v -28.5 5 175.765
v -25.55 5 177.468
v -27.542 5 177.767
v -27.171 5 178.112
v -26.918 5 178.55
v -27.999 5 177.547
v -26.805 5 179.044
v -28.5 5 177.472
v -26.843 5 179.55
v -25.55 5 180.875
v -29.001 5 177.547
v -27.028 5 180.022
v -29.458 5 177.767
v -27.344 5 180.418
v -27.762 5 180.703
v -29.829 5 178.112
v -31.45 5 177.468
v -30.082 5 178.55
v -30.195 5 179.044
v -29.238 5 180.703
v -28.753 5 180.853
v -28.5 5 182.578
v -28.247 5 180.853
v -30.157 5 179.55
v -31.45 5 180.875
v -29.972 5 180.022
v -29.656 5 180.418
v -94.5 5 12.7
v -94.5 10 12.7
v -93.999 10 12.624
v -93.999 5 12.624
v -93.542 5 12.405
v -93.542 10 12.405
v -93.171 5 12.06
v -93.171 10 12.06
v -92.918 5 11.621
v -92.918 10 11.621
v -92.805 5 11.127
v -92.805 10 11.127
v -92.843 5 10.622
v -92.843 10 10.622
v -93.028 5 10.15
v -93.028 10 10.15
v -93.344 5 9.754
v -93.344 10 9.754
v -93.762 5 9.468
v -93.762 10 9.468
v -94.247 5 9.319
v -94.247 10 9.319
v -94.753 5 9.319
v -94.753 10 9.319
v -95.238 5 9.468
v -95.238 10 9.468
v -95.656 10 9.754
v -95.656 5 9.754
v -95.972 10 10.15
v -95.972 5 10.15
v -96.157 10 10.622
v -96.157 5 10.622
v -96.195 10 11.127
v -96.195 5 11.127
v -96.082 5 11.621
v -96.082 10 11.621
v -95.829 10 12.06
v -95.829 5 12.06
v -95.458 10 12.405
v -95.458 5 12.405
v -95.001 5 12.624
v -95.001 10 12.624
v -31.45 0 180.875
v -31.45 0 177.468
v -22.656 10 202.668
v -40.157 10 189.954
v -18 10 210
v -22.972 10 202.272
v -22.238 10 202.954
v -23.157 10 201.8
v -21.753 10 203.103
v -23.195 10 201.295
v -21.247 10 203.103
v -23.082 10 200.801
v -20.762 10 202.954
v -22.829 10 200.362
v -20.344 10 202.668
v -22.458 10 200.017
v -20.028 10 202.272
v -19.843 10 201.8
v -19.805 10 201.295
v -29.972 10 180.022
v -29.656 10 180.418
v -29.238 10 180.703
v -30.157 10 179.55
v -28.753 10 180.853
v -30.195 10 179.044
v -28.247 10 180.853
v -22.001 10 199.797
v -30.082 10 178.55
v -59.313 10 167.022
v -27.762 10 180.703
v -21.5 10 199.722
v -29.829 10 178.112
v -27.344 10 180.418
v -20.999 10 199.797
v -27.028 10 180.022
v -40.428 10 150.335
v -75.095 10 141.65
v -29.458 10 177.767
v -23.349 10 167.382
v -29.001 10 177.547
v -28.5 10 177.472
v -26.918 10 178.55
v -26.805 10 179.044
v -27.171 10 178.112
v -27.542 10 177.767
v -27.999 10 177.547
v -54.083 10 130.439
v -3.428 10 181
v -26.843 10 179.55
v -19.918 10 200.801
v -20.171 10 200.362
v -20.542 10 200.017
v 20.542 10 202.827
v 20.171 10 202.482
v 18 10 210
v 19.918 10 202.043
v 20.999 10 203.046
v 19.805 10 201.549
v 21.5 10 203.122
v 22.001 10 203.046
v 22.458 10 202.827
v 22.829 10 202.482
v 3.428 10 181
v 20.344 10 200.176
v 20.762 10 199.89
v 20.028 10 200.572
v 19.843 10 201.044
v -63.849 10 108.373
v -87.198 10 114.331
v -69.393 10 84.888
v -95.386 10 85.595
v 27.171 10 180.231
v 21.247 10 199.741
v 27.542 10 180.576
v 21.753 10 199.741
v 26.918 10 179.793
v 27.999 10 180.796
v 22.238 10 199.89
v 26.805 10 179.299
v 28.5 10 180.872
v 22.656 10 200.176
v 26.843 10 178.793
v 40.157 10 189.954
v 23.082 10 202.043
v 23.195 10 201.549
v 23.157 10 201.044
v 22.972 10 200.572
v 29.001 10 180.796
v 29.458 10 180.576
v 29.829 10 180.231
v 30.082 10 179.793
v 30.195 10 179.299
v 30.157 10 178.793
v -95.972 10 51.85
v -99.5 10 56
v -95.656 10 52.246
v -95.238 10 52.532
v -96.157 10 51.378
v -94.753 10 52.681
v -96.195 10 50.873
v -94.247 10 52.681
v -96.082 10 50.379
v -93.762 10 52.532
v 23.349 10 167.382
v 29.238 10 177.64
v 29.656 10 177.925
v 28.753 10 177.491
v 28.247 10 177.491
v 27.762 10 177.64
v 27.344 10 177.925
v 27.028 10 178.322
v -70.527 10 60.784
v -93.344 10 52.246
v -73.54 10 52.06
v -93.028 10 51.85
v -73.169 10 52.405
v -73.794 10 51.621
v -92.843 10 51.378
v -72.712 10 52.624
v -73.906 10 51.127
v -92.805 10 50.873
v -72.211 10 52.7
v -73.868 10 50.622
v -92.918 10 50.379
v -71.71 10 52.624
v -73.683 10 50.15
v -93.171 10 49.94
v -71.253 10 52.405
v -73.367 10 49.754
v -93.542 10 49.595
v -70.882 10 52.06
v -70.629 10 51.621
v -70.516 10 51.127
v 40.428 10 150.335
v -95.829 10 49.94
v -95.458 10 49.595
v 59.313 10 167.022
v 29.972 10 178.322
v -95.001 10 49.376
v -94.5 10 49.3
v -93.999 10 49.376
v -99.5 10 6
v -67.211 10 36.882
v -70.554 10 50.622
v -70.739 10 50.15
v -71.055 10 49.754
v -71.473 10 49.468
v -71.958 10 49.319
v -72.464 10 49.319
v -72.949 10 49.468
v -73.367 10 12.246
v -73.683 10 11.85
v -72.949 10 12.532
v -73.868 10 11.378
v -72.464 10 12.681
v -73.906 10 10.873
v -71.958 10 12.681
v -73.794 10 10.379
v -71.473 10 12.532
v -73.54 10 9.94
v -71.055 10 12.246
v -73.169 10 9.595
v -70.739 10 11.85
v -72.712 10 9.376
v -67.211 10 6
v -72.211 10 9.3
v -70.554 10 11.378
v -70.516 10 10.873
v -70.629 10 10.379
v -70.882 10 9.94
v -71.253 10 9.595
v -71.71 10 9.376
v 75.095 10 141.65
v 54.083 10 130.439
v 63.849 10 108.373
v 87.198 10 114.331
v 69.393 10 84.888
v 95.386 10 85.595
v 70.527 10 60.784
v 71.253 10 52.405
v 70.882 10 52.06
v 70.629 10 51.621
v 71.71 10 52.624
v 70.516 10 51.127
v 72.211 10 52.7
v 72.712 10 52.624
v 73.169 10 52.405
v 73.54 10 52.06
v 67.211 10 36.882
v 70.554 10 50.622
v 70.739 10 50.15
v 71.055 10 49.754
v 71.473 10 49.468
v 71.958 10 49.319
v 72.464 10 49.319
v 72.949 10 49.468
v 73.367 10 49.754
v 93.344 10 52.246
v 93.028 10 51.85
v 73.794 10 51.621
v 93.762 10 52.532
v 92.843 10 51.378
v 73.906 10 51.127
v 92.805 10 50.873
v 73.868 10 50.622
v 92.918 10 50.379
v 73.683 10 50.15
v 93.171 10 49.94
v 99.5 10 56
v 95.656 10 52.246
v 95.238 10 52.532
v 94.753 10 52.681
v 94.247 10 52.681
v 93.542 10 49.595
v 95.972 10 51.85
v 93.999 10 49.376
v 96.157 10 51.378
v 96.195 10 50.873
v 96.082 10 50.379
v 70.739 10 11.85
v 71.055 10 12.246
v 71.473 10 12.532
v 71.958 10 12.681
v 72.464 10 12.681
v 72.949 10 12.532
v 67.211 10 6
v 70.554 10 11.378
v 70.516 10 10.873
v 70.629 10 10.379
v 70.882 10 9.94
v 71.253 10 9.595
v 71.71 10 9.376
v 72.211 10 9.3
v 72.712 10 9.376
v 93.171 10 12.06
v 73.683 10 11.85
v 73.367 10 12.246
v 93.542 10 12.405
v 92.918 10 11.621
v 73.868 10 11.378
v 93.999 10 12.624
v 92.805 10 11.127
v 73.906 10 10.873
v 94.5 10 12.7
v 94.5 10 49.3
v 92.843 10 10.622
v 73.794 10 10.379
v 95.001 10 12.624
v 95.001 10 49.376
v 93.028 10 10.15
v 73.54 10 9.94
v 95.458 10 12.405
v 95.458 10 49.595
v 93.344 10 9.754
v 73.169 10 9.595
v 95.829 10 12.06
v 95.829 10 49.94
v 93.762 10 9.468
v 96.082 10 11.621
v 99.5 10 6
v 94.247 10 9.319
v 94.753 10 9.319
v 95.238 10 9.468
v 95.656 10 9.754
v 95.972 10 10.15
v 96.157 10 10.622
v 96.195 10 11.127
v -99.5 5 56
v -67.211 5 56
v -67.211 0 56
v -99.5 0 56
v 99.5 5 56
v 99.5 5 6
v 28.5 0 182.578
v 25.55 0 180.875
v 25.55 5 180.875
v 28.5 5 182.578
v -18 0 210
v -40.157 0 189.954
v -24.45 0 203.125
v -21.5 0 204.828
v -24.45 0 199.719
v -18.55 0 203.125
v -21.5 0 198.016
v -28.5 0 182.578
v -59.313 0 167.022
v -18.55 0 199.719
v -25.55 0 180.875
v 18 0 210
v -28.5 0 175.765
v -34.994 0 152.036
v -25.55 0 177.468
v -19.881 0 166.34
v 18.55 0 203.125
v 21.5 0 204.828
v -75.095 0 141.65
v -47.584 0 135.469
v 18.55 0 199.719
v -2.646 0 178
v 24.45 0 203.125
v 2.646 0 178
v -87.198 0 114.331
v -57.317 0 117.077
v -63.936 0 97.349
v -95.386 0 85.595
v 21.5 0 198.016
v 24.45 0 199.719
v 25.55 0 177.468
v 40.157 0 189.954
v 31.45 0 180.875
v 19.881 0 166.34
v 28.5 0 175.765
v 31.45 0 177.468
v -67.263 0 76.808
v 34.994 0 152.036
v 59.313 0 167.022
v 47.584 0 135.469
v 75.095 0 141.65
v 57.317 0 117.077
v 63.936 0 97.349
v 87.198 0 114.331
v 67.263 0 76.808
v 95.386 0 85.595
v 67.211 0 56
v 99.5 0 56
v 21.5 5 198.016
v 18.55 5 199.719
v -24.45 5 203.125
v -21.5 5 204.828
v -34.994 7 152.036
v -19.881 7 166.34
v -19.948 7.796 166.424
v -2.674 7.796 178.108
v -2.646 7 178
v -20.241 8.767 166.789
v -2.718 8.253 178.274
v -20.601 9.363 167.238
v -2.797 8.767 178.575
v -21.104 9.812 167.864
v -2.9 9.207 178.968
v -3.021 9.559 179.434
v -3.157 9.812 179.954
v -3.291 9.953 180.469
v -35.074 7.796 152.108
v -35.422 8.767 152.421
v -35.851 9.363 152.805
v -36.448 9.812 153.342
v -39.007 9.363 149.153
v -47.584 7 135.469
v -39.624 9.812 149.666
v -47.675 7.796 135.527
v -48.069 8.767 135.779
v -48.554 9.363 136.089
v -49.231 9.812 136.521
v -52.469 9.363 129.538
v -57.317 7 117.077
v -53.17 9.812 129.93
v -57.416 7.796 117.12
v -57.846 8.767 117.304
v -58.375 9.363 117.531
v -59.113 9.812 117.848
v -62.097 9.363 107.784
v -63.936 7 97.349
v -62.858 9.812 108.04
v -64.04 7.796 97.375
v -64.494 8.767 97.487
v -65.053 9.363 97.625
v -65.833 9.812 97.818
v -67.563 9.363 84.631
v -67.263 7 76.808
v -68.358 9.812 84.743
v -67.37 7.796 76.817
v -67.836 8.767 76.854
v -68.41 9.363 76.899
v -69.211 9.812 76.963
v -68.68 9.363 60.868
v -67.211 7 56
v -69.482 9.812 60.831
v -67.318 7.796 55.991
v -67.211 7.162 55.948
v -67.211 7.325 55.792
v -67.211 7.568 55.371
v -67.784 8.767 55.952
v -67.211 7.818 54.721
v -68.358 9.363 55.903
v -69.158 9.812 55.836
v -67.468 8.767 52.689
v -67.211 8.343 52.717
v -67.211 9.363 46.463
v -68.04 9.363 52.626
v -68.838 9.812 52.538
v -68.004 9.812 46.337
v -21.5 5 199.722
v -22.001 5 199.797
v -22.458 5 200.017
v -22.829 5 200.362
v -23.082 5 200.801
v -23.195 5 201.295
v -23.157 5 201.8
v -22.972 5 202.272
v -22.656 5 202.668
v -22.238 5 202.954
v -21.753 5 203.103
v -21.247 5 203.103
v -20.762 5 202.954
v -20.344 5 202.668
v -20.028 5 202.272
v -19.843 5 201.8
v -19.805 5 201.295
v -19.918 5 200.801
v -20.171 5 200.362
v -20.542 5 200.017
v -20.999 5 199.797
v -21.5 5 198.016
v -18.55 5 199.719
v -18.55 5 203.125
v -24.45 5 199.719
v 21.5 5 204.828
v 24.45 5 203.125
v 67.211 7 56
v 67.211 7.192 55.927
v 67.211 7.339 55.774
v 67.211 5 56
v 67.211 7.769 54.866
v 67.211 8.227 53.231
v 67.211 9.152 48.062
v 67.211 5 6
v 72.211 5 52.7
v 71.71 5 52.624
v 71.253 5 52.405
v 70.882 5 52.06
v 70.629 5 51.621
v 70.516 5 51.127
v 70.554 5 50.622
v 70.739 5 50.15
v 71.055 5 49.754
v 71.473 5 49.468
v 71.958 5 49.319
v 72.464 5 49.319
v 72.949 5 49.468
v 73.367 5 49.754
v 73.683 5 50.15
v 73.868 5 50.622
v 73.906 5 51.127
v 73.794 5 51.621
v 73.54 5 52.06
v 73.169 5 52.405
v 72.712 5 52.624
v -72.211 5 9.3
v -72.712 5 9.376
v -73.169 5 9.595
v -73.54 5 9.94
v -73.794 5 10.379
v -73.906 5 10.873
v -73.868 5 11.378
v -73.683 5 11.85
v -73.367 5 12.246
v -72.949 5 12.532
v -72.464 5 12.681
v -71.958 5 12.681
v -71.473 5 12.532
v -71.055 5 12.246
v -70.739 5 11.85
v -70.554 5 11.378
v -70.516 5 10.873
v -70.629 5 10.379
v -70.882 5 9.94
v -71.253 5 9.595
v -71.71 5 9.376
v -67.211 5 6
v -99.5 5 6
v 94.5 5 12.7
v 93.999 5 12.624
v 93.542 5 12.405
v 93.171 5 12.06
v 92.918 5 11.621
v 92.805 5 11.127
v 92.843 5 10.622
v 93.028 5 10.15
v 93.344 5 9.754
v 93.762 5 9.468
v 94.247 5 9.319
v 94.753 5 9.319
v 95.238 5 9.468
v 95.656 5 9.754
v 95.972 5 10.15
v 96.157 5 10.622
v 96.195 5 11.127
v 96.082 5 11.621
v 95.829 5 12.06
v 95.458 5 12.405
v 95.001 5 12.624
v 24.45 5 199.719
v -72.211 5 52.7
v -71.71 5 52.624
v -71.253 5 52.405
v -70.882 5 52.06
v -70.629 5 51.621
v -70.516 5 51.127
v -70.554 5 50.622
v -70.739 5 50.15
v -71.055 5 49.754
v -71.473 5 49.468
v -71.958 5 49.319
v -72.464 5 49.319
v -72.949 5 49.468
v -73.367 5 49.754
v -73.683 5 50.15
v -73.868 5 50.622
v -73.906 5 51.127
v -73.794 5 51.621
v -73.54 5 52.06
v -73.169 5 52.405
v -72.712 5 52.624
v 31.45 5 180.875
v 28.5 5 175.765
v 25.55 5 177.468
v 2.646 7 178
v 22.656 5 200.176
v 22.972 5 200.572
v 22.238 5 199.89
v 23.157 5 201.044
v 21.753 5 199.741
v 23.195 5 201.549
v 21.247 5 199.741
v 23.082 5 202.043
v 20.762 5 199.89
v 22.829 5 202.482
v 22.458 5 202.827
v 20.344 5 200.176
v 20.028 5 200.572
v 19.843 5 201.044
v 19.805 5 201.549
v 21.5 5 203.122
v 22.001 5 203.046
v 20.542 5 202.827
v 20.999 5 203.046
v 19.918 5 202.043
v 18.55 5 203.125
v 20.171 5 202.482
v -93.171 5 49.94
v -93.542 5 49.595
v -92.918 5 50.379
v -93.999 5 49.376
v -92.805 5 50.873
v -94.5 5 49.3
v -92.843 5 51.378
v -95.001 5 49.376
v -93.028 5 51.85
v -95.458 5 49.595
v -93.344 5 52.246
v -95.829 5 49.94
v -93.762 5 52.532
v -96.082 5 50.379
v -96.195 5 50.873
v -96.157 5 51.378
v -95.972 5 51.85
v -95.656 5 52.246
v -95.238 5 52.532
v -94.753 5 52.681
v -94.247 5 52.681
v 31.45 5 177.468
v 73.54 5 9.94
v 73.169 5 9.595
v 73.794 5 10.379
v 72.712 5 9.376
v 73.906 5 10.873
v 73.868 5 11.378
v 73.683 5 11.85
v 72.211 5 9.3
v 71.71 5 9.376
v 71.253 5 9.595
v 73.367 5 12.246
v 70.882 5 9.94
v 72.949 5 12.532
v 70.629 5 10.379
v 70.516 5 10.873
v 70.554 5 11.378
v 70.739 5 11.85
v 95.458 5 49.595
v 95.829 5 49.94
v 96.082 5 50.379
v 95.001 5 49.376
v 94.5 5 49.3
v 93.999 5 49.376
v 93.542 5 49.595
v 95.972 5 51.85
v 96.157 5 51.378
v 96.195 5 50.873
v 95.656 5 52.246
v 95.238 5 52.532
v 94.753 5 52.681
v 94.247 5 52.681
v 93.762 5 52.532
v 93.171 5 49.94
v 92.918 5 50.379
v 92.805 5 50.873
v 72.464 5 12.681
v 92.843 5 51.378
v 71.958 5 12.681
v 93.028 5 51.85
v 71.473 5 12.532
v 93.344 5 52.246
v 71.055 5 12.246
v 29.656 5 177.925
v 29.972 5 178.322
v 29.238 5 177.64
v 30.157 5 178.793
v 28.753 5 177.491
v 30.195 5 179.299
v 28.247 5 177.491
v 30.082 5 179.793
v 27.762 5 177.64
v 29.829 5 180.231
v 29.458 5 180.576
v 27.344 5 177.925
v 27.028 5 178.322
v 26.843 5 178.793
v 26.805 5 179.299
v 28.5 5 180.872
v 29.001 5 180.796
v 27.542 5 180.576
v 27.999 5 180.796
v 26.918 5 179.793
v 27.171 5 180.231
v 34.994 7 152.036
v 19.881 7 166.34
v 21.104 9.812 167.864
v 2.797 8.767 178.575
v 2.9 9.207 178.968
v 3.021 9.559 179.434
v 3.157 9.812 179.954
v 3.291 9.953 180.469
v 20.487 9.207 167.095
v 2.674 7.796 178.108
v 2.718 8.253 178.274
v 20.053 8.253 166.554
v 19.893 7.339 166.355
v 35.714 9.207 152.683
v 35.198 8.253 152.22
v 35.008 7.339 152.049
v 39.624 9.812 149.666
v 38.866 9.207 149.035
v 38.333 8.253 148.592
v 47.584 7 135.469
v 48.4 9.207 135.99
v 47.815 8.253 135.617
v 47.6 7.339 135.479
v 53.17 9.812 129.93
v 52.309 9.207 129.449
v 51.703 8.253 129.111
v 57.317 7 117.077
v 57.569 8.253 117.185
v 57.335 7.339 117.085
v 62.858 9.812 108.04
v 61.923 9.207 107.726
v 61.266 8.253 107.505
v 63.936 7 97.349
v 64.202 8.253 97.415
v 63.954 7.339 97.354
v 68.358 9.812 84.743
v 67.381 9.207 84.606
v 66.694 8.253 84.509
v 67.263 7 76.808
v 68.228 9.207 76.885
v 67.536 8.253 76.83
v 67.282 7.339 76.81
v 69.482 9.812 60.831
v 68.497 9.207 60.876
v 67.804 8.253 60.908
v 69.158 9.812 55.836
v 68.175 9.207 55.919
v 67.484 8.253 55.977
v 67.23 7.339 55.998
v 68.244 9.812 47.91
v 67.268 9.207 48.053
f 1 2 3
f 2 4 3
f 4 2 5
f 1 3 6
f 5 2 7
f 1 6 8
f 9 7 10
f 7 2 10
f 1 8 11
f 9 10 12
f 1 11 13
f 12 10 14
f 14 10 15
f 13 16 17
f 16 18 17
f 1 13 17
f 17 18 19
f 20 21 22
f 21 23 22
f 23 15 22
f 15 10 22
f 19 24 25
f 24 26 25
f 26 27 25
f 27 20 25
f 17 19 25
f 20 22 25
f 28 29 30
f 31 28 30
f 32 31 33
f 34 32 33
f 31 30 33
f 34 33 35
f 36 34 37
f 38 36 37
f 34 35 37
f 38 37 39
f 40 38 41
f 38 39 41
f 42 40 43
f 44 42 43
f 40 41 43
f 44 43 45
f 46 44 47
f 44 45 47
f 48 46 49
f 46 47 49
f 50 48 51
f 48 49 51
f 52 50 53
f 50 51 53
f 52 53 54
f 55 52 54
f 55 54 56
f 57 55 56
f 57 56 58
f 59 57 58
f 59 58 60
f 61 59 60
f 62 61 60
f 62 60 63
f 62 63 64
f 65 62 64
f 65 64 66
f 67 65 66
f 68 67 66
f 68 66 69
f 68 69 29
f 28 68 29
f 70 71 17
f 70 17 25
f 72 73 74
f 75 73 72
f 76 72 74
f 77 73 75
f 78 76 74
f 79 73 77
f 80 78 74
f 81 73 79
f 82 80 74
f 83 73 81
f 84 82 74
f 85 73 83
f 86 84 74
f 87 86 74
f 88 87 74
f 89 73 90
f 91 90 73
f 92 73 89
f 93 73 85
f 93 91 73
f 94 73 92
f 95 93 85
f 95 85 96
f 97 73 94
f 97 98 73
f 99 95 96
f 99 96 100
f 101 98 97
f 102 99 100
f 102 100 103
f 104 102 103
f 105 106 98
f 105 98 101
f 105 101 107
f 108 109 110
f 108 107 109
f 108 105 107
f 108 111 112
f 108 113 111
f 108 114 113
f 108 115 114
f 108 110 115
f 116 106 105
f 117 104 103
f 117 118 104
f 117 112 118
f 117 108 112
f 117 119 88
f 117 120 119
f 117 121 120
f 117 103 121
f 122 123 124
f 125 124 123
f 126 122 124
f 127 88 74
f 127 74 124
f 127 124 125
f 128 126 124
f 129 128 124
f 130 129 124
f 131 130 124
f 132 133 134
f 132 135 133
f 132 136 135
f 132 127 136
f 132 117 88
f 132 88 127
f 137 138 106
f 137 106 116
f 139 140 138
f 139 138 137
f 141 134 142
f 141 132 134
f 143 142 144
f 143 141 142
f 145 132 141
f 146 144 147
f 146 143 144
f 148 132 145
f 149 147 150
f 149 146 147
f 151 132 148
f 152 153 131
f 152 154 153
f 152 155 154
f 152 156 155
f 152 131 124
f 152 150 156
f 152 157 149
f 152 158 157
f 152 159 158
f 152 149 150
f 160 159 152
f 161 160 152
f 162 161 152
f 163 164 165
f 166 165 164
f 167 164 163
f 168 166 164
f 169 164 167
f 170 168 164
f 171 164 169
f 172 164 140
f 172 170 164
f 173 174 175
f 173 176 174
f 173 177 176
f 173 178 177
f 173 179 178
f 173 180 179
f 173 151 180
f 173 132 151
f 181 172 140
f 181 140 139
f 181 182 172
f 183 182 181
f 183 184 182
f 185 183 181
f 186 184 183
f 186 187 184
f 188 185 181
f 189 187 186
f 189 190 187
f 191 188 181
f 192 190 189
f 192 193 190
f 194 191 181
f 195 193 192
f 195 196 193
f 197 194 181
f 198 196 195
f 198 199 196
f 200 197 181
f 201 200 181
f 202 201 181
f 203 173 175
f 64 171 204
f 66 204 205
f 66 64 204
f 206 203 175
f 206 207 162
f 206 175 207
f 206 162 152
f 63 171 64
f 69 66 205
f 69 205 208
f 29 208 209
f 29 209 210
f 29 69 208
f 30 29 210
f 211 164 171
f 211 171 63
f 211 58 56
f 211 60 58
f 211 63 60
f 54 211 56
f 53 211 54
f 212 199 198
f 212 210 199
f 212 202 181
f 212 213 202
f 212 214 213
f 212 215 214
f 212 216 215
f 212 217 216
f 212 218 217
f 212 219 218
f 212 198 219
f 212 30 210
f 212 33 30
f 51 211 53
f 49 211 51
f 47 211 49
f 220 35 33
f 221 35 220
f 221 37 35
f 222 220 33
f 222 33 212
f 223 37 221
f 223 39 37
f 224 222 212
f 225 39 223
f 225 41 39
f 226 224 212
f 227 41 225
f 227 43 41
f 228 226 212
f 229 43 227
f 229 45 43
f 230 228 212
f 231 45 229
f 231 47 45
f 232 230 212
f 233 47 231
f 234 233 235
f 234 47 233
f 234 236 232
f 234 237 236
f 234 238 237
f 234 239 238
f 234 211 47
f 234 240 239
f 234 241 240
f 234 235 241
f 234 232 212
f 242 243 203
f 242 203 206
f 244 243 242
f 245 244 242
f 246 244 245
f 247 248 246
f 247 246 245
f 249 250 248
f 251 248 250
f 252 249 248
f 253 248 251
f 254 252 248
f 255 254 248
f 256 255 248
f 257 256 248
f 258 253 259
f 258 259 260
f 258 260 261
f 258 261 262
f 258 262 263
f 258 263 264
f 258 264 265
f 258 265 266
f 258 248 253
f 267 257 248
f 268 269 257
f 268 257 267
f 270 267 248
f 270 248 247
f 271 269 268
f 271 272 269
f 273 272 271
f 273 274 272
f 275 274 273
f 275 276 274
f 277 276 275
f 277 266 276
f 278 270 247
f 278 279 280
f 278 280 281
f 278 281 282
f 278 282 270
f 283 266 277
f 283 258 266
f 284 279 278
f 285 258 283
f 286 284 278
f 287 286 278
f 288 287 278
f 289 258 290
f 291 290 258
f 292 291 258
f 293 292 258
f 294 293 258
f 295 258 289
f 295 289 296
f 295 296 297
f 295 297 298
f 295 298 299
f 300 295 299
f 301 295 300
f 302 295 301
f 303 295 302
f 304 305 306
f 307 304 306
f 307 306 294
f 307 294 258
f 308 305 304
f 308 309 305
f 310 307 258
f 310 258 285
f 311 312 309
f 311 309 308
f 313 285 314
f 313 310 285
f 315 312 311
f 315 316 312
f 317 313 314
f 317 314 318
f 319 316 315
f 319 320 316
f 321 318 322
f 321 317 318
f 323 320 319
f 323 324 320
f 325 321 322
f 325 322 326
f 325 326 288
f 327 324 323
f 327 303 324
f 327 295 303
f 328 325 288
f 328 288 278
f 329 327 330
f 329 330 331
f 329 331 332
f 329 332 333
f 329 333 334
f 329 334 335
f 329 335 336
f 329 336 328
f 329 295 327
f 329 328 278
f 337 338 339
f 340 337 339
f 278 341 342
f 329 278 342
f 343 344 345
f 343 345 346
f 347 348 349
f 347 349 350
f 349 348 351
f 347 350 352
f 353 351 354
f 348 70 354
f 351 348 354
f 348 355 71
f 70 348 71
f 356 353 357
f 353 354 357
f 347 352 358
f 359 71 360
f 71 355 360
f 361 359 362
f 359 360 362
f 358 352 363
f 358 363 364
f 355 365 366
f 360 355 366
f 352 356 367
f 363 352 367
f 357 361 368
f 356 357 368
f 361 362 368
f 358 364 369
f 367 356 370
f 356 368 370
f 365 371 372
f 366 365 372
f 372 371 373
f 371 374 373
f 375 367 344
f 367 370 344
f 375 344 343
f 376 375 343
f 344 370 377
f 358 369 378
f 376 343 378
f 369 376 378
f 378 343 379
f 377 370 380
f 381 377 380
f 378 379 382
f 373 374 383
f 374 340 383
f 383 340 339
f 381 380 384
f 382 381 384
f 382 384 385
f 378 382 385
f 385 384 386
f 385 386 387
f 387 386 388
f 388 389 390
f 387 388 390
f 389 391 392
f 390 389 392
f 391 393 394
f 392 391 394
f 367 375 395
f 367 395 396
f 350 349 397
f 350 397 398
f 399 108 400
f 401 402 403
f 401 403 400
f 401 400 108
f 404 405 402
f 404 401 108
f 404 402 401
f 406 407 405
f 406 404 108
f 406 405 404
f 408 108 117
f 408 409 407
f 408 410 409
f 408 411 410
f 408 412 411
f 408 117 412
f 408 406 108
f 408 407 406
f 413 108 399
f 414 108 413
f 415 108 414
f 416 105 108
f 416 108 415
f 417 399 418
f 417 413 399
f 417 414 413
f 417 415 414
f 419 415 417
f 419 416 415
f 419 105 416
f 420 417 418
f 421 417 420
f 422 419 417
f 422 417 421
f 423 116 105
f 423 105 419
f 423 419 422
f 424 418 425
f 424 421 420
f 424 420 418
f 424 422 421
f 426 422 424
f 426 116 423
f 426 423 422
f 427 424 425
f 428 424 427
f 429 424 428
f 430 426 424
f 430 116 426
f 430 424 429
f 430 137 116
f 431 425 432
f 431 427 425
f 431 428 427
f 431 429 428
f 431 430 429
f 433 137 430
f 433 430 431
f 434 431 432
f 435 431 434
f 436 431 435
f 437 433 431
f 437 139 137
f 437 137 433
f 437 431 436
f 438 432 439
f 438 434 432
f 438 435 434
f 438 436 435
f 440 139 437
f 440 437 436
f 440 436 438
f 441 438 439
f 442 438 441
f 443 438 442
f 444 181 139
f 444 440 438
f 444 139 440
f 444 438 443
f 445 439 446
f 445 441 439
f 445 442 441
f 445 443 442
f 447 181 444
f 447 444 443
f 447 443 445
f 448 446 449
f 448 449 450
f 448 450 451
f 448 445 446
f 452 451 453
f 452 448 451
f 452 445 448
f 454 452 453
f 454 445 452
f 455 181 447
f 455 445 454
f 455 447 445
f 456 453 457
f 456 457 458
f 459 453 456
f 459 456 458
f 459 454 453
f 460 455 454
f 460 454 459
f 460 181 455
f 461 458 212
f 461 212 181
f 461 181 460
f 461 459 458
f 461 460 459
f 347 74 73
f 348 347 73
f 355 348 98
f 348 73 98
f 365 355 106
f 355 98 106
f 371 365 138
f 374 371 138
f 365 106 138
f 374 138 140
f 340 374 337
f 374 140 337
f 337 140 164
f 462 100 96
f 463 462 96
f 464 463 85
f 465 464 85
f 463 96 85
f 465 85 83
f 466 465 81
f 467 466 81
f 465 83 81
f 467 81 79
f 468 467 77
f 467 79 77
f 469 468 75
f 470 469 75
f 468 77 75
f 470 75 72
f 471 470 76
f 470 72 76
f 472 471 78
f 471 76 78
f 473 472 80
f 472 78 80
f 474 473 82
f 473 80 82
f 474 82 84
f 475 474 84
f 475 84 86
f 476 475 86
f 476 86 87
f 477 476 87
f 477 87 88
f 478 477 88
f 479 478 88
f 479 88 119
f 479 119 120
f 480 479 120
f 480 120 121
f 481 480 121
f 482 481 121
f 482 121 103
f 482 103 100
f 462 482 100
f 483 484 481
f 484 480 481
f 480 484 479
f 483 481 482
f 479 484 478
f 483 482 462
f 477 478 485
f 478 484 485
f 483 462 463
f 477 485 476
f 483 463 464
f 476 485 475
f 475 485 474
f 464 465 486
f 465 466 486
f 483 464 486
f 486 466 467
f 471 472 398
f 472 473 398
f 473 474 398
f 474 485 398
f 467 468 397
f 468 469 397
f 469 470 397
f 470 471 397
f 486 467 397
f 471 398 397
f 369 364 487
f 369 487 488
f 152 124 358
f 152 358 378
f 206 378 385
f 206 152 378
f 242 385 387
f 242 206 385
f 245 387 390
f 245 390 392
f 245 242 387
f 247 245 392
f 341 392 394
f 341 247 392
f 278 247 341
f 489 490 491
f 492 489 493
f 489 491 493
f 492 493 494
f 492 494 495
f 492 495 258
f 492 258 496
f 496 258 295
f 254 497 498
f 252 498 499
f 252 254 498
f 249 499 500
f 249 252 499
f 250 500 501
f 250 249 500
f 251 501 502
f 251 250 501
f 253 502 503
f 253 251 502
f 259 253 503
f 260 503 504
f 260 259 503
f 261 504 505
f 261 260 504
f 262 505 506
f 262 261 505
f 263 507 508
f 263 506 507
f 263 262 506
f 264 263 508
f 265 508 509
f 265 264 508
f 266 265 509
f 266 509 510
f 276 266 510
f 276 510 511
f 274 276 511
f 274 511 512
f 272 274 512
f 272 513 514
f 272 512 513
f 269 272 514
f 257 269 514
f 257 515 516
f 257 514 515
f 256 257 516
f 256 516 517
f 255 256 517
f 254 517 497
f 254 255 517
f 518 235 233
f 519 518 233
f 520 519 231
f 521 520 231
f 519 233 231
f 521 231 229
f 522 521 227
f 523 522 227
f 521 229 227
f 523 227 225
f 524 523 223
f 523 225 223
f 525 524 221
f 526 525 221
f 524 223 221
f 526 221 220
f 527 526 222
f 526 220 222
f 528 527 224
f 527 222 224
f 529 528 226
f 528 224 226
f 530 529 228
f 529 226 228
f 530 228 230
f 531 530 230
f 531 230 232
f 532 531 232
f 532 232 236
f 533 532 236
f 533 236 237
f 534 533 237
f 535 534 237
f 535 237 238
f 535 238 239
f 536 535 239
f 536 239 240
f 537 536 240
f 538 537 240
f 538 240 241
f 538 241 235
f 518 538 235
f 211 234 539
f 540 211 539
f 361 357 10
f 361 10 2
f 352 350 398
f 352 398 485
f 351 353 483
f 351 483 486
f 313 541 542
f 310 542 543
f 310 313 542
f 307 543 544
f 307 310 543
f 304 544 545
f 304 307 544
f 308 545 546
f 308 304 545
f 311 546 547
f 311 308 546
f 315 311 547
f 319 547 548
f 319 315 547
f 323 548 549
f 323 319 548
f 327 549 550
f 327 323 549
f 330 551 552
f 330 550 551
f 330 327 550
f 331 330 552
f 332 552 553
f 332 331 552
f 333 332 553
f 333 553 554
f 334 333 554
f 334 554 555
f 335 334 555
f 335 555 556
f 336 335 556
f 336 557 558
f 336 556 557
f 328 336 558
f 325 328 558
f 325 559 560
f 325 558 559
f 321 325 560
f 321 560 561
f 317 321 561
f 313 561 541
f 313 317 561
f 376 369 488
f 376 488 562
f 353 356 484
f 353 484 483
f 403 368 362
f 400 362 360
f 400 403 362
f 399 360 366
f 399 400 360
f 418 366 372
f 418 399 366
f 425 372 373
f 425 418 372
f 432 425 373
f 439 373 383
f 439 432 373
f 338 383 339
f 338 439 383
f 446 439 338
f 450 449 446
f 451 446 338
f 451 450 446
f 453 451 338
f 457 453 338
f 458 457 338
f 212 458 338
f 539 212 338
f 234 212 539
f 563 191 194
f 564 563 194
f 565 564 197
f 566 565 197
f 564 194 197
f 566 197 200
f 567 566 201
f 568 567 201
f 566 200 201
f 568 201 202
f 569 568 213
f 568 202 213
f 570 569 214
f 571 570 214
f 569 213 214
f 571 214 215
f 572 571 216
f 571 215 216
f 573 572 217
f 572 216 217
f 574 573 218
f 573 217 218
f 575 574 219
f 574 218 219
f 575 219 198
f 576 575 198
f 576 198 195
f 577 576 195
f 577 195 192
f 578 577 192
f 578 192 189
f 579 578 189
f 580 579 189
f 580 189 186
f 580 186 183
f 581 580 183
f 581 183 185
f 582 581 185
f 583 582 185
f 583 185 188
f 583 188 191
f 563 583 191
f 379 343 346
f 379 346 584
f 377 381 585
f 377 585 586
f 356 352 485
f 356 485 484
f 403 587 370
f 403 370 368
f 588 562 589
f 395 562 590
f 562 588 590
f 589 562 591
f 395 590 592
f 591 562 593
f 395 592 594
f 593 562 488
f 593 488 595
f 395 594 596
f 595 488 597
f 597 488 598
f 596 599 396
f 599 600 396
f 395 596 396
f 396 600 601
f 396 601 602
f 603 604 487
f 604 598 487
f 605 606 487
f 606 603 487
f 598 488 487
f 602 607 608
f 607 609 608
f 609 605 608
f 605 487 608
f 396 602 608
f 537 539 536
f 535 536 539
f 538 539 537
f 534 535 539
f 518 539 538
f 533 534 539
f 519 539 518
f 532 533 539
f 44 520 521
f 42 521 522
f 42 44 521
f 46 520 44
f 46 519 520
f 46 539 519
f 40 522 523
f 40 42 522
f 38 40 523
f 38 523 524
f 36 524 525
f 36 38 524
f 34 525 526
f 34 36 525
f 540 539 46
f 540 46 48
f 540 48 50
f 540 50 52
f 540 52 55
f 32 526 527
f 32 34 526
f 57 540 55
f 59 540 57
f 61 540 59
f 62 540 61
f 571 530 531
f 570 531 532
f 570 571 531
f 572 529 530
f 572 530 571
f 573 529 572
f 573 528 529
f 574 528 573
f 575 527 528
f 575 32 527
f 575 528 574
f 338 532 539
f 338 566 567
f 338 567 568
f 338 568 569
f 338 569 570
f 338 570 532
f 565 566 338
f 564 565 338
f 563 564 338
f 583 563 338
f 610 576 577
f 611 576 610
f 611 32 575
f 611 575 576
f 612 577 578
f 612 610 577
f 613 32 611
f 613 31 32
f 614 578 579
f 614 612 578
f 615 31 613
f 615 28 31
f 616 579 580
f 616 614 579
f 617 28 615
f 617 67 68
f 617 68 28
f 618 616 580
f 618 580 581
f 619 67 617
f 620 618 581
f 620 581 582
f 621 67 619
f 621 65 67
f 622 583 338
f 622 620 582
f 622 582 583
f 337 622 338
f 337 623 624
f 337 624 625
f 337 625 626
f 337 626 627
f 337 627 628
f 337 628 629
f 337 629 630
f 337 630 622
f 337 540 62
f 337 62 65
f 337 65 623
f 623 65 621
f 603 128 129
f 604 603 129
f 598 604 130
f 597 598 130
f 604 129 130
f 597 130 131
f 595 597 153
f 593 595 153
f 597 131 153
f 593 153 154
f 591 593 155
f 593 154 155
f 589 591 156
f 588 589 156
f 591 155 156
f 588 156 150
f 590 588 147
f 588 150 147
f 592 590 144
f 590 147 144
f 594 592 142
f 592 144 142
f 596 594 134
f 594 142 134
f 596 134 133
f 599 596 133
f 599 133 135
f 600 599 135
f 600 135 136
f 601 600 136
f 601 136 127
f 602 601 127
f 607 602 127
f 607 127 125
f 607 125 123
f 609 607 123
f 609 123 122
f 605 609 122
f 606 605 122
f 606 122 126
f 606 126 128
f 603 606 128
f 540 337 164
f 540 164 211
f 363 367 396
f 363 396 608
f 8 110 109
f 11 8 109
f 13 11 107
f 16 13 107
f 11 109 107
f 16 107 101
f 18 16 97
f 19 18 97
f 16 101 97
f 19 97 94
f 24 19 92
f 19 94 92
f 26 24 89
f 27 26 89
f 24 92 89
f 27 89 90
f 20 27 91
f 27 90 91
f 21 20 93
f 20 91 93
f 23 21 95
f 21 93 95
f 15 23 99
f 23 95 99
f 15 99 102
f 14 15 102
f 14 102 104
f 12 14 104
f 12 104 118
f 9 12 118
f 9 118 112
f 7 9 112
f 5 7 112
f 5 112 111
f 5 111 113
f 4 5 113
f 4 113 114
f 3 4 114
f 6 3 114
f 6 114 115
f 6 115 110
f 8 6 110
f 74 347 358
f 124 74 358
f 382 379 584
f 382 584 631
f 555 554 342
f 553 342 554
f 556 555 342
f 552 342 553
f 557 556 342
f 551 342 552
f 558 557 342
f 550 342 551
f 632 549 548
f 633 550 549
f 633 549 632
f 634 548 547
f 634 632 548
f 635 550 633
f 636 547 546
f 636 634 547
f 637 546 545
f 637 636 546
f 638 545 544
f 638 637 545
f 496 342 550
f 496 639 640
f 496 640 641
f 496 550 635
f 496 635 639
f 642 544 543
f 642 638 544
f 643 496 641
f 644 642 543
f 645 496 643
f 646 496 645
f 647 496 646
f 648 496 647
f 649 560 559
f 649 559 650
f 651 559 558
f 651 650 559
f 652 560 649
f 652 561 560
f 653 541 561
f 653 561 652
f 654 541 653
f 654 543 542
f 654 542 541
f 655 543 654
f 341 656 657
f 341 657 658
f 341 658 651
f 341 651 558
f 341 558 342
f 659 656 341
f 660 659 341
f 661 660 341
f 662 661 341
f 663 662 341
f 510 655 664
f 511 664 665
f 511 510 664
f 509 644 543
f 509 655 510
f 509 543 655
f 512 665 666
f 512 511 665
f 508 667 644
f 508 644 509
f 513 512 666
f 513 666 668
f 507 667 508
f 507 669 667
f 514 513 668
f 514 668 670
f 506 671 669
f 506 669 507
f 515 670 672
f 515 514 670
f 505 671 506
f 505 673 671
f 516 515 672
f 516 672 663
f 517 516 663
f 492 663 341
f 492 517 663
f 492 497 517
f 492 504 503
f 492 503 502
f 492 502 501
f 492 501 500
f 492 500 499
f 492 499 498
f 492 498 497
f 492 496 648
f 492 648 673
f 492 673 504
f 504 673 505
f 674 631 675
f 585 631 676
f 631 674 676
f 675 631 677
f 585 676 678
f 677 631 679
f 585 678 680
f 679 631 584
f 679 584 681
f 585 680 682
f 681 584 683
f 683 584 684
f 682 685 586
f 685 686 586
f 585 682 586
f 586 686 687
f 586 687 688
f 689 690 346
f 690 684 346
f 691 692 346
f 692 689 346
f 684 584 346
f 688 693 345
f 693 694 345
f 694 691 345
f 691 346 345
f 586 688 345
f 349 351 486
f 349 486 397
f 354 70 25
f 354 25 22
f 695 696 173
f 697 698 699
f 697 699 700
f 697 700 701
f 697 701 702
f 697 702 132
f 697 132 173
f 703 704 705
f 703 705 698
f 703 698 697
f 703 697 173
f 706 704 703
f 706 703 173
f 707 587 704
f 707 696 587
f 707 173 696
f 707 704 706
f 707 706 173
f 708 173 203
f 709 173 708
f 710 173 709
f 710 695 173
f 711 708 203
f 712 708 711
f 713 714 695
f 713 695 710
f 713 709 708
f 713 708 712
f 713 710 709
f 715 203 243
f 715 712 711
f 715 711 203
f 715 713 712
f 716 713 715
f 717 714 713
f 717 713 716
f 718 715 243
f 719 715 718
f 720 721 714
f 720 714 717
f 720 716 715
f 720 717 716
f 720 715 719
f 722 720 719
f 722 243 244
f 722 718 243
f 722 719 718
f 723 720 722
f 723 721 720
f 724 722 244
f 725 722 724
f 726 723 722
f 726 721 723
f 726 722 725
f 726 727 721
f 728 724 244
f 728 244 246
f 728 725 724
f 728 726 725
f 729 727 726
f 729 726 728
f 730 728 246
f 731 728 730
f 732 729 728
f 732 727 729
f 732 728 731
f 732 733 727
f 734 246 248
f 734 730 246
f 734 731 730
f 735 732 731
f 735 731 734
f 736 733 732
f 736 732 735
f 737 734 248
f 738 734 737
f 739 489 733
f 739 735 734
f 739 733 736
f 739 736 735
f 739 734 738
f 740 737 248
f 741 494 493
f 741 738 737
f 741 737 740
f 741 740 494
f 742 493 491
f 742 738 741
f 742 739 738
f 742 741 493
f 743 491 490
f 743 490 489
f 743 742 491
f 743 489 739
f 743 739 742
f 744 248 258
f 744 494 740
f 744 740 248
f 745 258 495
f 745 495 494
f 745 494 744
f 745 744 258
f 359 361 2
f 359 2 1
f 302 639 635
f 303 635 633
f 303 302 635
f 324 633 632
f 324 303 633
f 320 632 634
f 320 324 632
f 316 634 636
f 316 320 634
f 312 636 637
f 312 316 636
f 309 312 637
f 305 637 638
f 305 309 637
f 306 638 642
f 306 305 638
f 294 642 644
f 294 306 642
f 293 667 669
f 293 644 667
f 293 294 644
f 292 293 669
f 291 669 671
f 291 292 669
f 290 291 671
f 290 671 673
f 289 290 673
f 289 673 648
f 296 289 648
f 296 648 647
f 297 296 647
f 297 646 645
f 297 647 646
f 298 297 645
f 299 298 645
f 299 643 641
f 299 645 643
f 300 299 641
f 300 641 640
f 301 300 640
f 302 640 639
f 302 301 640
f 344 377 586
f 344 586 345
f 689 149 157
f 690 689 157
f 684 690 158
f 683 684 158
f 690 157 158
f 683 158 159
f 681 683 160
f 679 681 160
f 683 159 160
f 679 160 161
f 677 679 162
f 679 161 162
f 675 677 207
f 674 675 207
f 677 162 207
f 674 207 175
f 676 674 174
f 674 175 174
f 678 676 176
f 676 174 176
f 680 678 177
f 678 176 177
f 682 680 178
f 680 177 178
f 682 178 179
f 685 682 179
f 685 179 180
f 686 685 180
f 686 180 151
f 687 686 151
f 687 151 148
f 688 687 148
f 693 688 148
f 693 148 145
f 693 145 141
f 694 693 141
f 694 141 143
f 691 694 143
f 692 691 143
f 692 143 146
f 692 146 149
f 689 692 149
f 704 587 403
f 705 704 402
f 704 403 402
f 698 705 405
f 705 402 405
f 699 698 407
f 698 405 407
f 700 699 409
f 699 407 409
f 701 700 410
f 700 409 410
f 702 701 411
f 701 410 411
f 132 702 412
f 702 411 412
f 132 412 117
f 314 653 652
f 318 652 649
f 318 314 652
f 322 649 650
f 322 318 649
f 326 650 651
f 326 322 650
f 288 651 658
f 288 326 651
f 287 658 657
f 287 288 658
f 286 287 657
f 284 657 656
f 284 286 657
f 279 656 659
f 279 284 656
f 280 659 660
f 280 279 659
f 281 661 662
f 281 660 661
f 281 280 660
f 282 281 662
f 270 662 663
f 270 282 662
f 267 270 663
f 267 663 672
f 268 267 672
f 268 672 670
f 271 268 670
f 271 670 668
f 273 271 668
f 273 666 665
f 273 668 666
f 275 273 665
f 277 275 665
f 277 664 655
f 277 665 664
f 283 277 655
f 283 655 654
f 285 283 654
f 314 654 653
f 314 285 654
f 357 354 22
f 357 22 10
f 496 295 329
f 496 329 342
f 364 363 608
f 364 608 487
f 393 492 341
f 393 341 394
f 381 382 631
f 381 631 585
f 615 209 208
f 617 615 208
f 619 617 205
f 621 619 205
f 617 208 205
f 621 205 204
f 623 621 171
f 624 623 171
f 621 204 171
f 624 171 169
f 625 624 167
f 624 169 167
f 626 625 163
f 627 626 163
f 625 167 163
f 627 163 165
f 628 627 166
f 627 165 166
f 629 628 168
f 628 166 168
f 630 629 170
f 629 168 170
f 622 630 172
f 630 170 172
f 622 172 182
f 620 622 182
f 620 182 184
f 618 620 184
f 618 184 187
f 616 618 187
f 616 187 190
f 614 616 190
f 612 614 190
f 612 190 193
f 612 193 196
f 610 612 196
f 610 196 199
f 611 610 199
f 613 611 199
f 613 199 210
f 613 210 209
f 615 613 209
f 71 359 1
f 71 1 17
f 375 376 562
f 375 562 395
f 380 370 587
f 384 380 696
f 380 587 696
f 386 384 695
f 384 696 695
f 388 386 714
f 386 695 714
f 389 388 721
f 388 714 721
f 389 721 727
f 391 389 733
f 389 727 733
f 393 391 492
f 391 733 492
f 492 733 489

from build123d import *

# Parameters (mm, degrees)
SKIZZE1_W                        = 199
SKIZZE1_H                        = 420
AUFSATZ_LINEAR_AUSTRAGEN1_DEPTH  = 10
SKIZZE5_W                        = 199
SKIZZE5_H                        = 85
SCHNITT_LINEAR_AUSTRAGEN2_DEPTH  = 10
SKIZZE20_R                       = 1.7
SCHNITT_LINEAR_AUSTRAGEN12_DEPTH = 233.594604409
SKIZZE21_W                       = 134.422077922
SKIZZE21_H                       = 75
SCHNITT_LINEAR_AUSTRAGEN13_DEPTH = 233.594604409
SCHNITT_LINEAR_AUSTRAGEN14_DEPTH = 233.594604409
AUFSATZ_LINEAR_AUSTRAGEN6_DEPTH  = 10
SKIZZE25_R                       = 1.7
SCHNITT_LINEAR_AUSTRAGEN15_DEPTH = 233.594604409
SCHNITT_LINEAR_AUSTRAGEN16_DEPTH = 290.484023739
VERRUNDUNG1_R                    = 3
SKIZZE27_R                       = 1.7
SCHNITT_LINEAR_AUSTRAGEN17_DEPTH = 233.594604409
SCHNITT_LINEAR_AUSTRAGEN18_DEPTH = 5


with BuildPart() as part:
    # Skizze1 → Aufsatz-Linear austragen1 (new body)
    with BuildSketch(Plane(origin=(0, 0, 0), x_dir=(1, 0, 0), z_dir=(0, 1, 0))):
        Rectangle(SKIZZE1_W, SKIZZE1_H)
    extrude(amount=AUFSATZ_LINEAR_AUSTRAGEN1_DEPTH)

    # Skizze5 → Schnitt-Linear austragen2 (cut)
    with BuildSketch(Plane(origin=(0, 10, 0), x_dir=(1, 0, 0), z_dir=(0, 1, 0))):
        Polygon((99.5, -210), (18, -210), (99.5, -56), align=None)
        Polygon((-18, -210), (-99.5, -56), (-99.5, -210), align=None)
        with Locations((0, 167.5)):
            Rectangle(SKIZZE5_W, SKIZZE5_H)
        Polygon((67.211038961, -56), (-67.211038961, -56), (-2.646103896, -178), (2.646103896, -178), align=None)
    extrude(amount=-SCHNITT_LINEAR_AUSTRAGEN2_DEPTH, mode=Mode.SUBTRACT)

    # Skizze20 → Schnitt-Linear austragen12 (cut, through all)
    with BuildSketch(Plane(origin=(0, 10, 0), x_dir=(1, 0, 0), z_dir=(0, 1, 0))):
        with Locations(Location((90.5, 119.52, 0), (0, 0, 270))):
            Circle(SKIZZE20_R)
        with Locations(Location((48.5, 119.52, 0), (0, 0, 270))):
            Circle(SKIZZE20_R)
        with Locations(Location((-48.5, 119.52, 0), (0, 0, 90))):
            Circle(SKIZZE20_R)
        with Locations(Location((-90.5, 119.52, 0), (0, 0, 90))):
            Circle(SKIZZE20_R)
        with Locations(Location((87, 43.82, 0), (0, 0, 270))):
            Circle(SKIZZE20_R)
        with Locations(Location((52, 43.82, 0), (0, 0, 270))):
            Circle(SKIZZE20_R)
        with Locations(Location((-87, 43.82, 0), (0, 0, 90))):
            Circle(SKIZZE20_R)
        with Locations(Location((-52, 43.82, 0), (0, 0, 90))):
            Circle(SKIZZE20_R)
    extrude(amount=-SCHNITT_LINEAR_AUSTRAGEN12_DEPTH, mode=Mode.SUBTRACT)

    # Skizze21 → Schnitt-Linear austragen13 (cut, through all)
    with BuildSketch(Plane(origin=(0, 10, 0), x_dir=(1, 0, 0), z_dir=(0, 1, 0))):
        with Locations((0, -18.5)):
            Rectangle(SKIZZE21_W, SKIZZE21_H)
    extrude(amount=-SCHNITT_LINEAR_AUSTRAGEN13_DEPTH, mode=Mode.SUBTRACT)

    # Skizze22 → Schnitt-Linear austragen14 (cut, through all)
    with BuildSketch(Plane(origin=(0, 10, 0), x_dir=(1, 0, 0), z_dir=(0, 1, 0))):
        with BuildLine():
            Line((-67.211038961, -56), (-2.646103896, -178))
            ThreePointArc((-2.646103896, -178), (-52.825886854, -126.471631215), (-67.211038961, -56))
        make_face()
    schnitt_linear_austragen14 = extrude(amount=-SCHNITT_LINEAR_AUSTRAGEN14_DEPTH, mode=Mode.SUBTRACT)

    # Skizze23 → Aufsatz-Linear austragen6 (add)
    with BuildSketch(Plane(origin=(0, 10, 0), x_dir=(1, 0, 0), z_dir=(0, 1, 0))):
        with BuildLine():
            Line((-99.5, -56), (-18, -210))
            ThreePointArc((-18, -210), (-75.095260266, -141.650251374), (-99.5, -56))
        make_face()
    aufsatz_linear_austragen6 = extrude(amount=-AUFSATZ_LINEAR_AUSTRAGEN6_DEPTH)

    # Spiegeln2: Schnitt-Linear austragen14, Aufsatz-Linear austragen6 across plane
    add(schnitt_linear_austragen14.mirror(Plane(origin=(0, 0, 0), x_dir=(0, 0, 1), z_dir=(1, 0, 0))), mode=Mode.SUBTRACT)
    add(aufsatz_linear_austragen6.mirror(Plane(origin=(0, 0, 0), x_dir=(0, 0, 1), z_dir=(1, 0, 0))))

    # Skizze25 → Schnitt-Linear austragen15 (cut, through all)
    with BuildSketch(Plane(origin=(0, 10, 0), x_dir=(1, 0, 0), z_dir=(0, 1, 0))):
        with Locations(Location((-94.5, -11, 0), (0, 0, 270))):
            Circle(SKIZZE25_R)
        with Locations(Location((-72.211038961, -11, 0), (0, 0, 90))):
            Circle(SKIZZE25_R)
        with Locations(Location((-72.211038961, -51, 0), (0, 0, 270))):
            Circle(SKIZZE25_R)
        with Locations(Location((-94.5, -51, 0), (0, 0, 90))):
            Circle(SKIZZE25_R)
    schnitt_linear_austragen15 = extrude(amount=-SCHNITT_LINEAR_AUSTRAGEN15_DEPTH, mode=Mode.SUBTRACT)

    # Spiegeln3: Schnitt-Linear austragen15 across plane
    add(schnitt_linear_austragen15.mirror(Plane(origin=(0, 0, 0), x_dir=(0, 0, 1), z_dir=(1, 0, 0))), mode=Mode.SUBTRACT)

    # Skizze26 → Schnitt-Linear austragen16 (cut, through all)
    with BuildSketch(Plane.ZY.offset(99.5)):
        Polygon((56, 5), (56, 0), (4.196805737, -14.401746423), (-137.707729511, -14.401746423), (-137.707729511, 19.508660812), (5.012761814, 19.508660812), (6, 10), (6, 5), align=None)
    extrude(amount=-SCHNITT_LINEAR_AUSTRAGEN16_DEPTH, mode=Mode.SUBTRACT)

    # Verrundung1
    # the kernel refuses this fillet: 3 mm, written as the material it takes off along each edge
    with BuildSketch(Plane(origin=(60.076908998, 10, 66.721125619), x_dir=(-0.4390500946900349, 0, 0.8984625837243705), z_dir=(0.8984625837243705, 0, 0.4390500946900349))) as verrundung1_piece_1_section:
        with BuildLine():
            CenterArc((127.738655974 + VERRUNDUNG1_R, VERRUNDUNG1_R), VERRUNDUNG1_R, 180, 90)
            Line((127.738655974, VERRUNDUNG1_R), (127.738655974, 0))
            Line((127.738655974, 0), (127.738655974 + VERRUNDUNG1_R, 0))
        make_face()
    verrundung1_piece_1 = revolve(axis=Axis((60.076908998, 10, 66.721125619), (0, -1, 0)), revolution_arc=78.865488706, mode=Mode.PRIVATE)
    verrundung1_piece_1 = split(verrundung1_piece_1, bisect_by=Plane(origin=(60.076908998, 10, 178), z_dir=(0, 0, -1)), keep=Keep.TOP, mode=Mode.PRIVATE)
    add(verrundung1_piece_1, mode=Mode.SUBTRACT)
    with BuildSketch(Plane(origin=(-60.076908998, 10, 66.721125619), x_dir=(0.4390500946900349, 0, 0.8984625837243705), z_dir=(-0.8984625837243705, 0, 0.4390500946900349))) as verrundung1_piece_2_section:
        with BuildLine():
            CenterArc((127.738655974 + VERRUNDUNG1_R, -VERRUNDUNG1_R), VERRUNDUNG1_R, 90, 90)
            Line((127.738655974, -VERRUNDUNG1_R), (127.738655974, 0))
            Line((127.738655974, 0), (127.738655974 + VERRUNDUNG1_R, 0))
        make_face()
    verrundung1_piece_2 = revolve(axis=Axis((-60.076908998, 10, 66.721125619), (0, 1, 0)), revolution_arc=78.865488706, mode=Mode.PRIVATE)
    verrundung1_piece_2 = split(verrundung1_piece_2, bisect_by=Plane(origin=(-60.076908998, 10, 178), z_dir=(0, 0, -1)), keep=Keep.TOP, mode=Mode.PRIVATE)
    add(verrundung1_piece_2, mode=Mode.SUBTRACT)
    with BuildSketch(Plane(origin=(-10.146103896, 10, 178), x_dir=(0, 0, 1), z_dir=(1, 0, 0))) as verrundung1_piece_3_section:
        with BuildLine():
            CenterArc((VERRUNDUNG1_R, VERRUNDUNG1_R), VERRUNDUNG1_R, 180, 90)
            Line((0, VERRUNDUNG1_R), (0, 0))
            Line((0, 0), (VERRUNDUNG1_R, 0))
        make_face()
    verrundung1_piece_3 = extrude(amount=20.292207792, mode=Mode.PRIVATE)
    verrundung1_piece_3 = verrundung1_piece_3 & Plane(origin=(60.076908998, 10, 66.721125619), x_dir=(-0.4910260908528423, 0, 0.8711448663120137), z_dir=(0, 1, 0)) * Cylinder(127.738655974, 53, mode=Mode.PRIVATE)
    verrundung1_piece_3 = verrundung1_piece_3 & Plane(origin=(-60.076908998, 10, 66.721125619), x_dir=(0.4910260908528423, 0, 0.8711448663120137), z_dir=(0, 1, 0)) * Cylinder(127.738655974, 53, mode=Mode.PRIVATE)
    add(verrundung1_piece_3, mode=Mode.SUBTRACT)
    with BuildSketch(Plane(origin=(-10.146103896, 10, 178), x_dir=(0, 0, 1), z_dir=(1, 0, 0))) as verrundung1_piece_4_section:
        with BuildLine():
            CenterArc((VERRUNDUNG1_R, VERRUNDUNG1_R), VERRUNDUNG1_R, 180, 90)
            Line((0, VERRUNDUNG1_R), (0, 0))
            Line((0, 0), (VERRUNDUNG1_R, 0))
        make_face()
    verrundung1_piece_4 = extrude(amount=20.292207792, mode=Mode.PRIVATE)
    verrundung1_piece_4 = verrundung1_piece_4 - Plane(origin=(60.076908998, 10, 66.721125619), x_dir=(-0.4910260908528423, 0, 0.8711448663120137), z_dir=(0, 1, 0)) * Cylinder(127.738655974, 53, mode=Mode.PRIVATE)
    verrundung1_piece_4 = verrundung1_piece_4 - Plane(origin=(-60.076908998, 10, 66.721125619), x_dir=(0.4910260908528423, 0, 0.8711448663120137), z_dir=(0, 1, 0)) * Cylinder(127.738655974, 53, mode=Mode.PRIVATE)
    add(verrundung1_piece_4, mode=Mode.SUBTRACT)
    with BuildSketch(Plane(origin=(60.076908998, 10, 66.721125619), x_dir=(-0.4390500946900349, 0, 0.8984625837243705), z_dir=(0.8984625837243705, 0, 0.4390500946900349))) as verrundung1_piece_5a_section:
        with BuildLine():
            CenterArc((127.738655974 + VERRUNDUNG1_R, VERRUNDUNG1_R), VERRUNDUNG1_R, 180, 90)
            Line((127.738655974, VERRUNDUNG1_R), (127.738655974, 0))
            Line((127.738655974, 0), (127.738655974 + VERRUNDUNG1_R, 0))
        make_face()
    verrundung1_piece_5a = revolve(axis=Axis((60.076908998, 10, 66.721125619), (0, -1, 0)), revolution_arc=78.865488706, mode=Mode.PRIVATE)
    verrundung1_piece_5a = split(verrundung1_piece_5a, bisect_by=Plane(origin=(60.076908998, 10, 178), z_dir=(0, 0, 1)), keep=Keep.TOP, mode=Mode.PRIVATE)
    with BuildSketch(Plane(origin=(-10.146103896, 10, 178), x_dir=(0, 0, 1), z_dir=(1, 0, 0))) as verrundung1_piece_5b_section:
        with BuildLine():
            CenterArc((VERRUNDUNG1_R, VERRUNDUNG1_R), VERRUNDUNG1_R, 180, 90)
            Line((0, VERRUNDUNG1_R), (0, 0))
            Line((0, 0), (VERRUNDUNG1_R, 0))
        make_face()
    verrundung1_piece_5b = extrude(amount=20.292207792, mode=Mode.PRIVATE)
    verrundung1_piece_5b = verrundung1_piece_5b - Plane(origin=(60.076908998, 10, 66.721125619), x_dir=(-0.4910260908528423, 0, 0.8711448663120137), z_dir=(0, 1, 0)) * Cylinder(127.738655974, 53, mode=Mode.PRIVATE)
    verrundung1_piece_5b = verrundung1_piece_5b & Plane(origin=(-60.076908998, 10, 66.721125619), x_dir=(0.4910260908528423, 0, 0.8711448663120137), z_dir=(0, 1, 0)) * Cylinder(127.738655974, 53, mode=Mode.PRIVATE)
    verrundung1_piece_5 = verrundung1_piece_5a & verrundung1_piece_5b
    add(verrundung1_piece_5, mode=Mode.SUBTRACT)
    with BuildSketch(Plane(origin=(-10.146103896, 10, 178), x_dir=(0, 0, 1), z_dir=(1, 0, 0))) as verrundung1_piece_6a_section:
        with BuildLine():
            CenterArc((VERRUNDUNG1_R, VERRUNDUNG1_R), VERRUNDUNG1_R, 180, 90)
            Line((0, VERRUNDUNG1_R), (0, 0))
            Line((0, 0), (VERRUNDUNG1_R, 0))
        make_face()
    verrundung1_piece_6a = extrude(amount=20.292207792, mode=Mode.PRIVATE)
    verrundung1_piece_6a = verrundung1_piece_6a & Plane(origin=(60.076908998, 10, 66.721125619), x_dir=(-0.4910260908528423, 0, 0.8711448663120137), z_dir=(0, 1, 0)) * Cylinder(127.738655974, 53, mode=Mode.PRIVATE)
    verrundung1_piece_6a = verrundung1_piece_6a - Plane(origin=(-60.076908998, 10, 66.721125619), x_dir=(0.4910260908528423, 0, 0.8711448663120137), z_dir=(0, 1, 0)) * Cylinder(127.738655974, 53, mode=Mode.PRIVATE)
    with BuildSketch(Plane(origin=(-60.076908998, 10, 66.721125619), x_dir=(0.4390500946900349, 0, 0.8984625837243705), z_dir=(-0.8984625837243705, 0, 0.4390500946900349))) as verrundung1_piece_6b_section:
        with BuildLine():
            CenterArc((127.738655974 + VERRUNDUNG1_R, -VERRUNDUNG1_R), VERRUNDUNG1_R, 90, 90)
            Line((127.738655974, -VERRUNDUNG1_R), (127.738655974, 0))
            Line((127.738655974, 0), (127.738655974 + VERRUNDUNG1_R, 0))
        make_face()
    verrundung1_piece_6b = revolve(axis=Axis((-60.076908998, 10, 66.721125619), (0, 1, 0)), revolution_arc=78.865488706, mode=Mode.PRIVATE)
    verrundung1_piece_6b = split(verrundung1_piece_6b, bisect_by=Plane(origin=(-60.076908998, 10, 178), z_dir=(0, 0, 1)), keep=Keep.TOP, mode=Mode.PRIVATE)
    verrundung1_piece_6 = verrundung1_piece_6a & verrundung1_piece_6b
    add(verrundung1_piece_6, mode=Mode.SUBTRACT)

    # Skizze27 → Schnitt-Linear austragen17 (cut, through all)
    with BuildSketch(Plane(origin=(0, 10, 0), x_dir=(1, 0, 0), z_dir=(0, 1, 0))):
        with Locations(Location((28.5, -179.171533214, 0), (0, 0, 270))):
            Circle(SKIZZE27_R)
        with Locations(Location((21.5, -201.421972318, 0), (0, 0, 270))):
            Circle(SKIZZE27_R)
        with Locations(Location((-21.5, -201.421972318, 0), (0, 0, 90))):
            Circle(SKIZZE27_R)
        with Locations(Location((-28.5, -179.171533214, 0), (0, 0, 90))):
            Circle(SKIZZE27_R)
    extrude(amount=-SCHNITT_LINEAR_AUSTRAGEN17_DEPTH, mode=Mode.SUBTRACT)

    # Skizze28 → Schnitt-Linear austragen18 (cut)
    with BuildSketch(Plane.XZ):
        Polygon((21.5, 204.828338906), (24.45, 203.125155612), (24.45, 199.718789024), (21.5, 198.01560573), (18.55, 199.718789024), (18.55, 203.125155612), align=None)
        Polygon((28.5, 182.577899803), (31.45, 180.874716508), (31.45, 177.46834992), (28.5, 175.765166626), (25.55, 177.46834992), (25.55, 180.874716508), align=None)
        Polygon((-28.5, 182.577899803), (-25.55, 180.874716508), (-25.55, 177.46834992), (-28.5, 175.765166626), (-31.45, 177.46834992), (-31.45, 180.874716508), align=None)
        Polygon((-21.5, 204.828338906), (-18.55, 203.125155612), (-18.55, 199.718789024), (-21.5, 198.01560573), (-24.45, 199.718789024), (-24.45, 203.125155612), align=None)
    extrude(amount=-SCHNITT_LINEAR_AUSTRAGEN18_DEPTH, mode=Mode.SUBTRACT)


solid = part.part
